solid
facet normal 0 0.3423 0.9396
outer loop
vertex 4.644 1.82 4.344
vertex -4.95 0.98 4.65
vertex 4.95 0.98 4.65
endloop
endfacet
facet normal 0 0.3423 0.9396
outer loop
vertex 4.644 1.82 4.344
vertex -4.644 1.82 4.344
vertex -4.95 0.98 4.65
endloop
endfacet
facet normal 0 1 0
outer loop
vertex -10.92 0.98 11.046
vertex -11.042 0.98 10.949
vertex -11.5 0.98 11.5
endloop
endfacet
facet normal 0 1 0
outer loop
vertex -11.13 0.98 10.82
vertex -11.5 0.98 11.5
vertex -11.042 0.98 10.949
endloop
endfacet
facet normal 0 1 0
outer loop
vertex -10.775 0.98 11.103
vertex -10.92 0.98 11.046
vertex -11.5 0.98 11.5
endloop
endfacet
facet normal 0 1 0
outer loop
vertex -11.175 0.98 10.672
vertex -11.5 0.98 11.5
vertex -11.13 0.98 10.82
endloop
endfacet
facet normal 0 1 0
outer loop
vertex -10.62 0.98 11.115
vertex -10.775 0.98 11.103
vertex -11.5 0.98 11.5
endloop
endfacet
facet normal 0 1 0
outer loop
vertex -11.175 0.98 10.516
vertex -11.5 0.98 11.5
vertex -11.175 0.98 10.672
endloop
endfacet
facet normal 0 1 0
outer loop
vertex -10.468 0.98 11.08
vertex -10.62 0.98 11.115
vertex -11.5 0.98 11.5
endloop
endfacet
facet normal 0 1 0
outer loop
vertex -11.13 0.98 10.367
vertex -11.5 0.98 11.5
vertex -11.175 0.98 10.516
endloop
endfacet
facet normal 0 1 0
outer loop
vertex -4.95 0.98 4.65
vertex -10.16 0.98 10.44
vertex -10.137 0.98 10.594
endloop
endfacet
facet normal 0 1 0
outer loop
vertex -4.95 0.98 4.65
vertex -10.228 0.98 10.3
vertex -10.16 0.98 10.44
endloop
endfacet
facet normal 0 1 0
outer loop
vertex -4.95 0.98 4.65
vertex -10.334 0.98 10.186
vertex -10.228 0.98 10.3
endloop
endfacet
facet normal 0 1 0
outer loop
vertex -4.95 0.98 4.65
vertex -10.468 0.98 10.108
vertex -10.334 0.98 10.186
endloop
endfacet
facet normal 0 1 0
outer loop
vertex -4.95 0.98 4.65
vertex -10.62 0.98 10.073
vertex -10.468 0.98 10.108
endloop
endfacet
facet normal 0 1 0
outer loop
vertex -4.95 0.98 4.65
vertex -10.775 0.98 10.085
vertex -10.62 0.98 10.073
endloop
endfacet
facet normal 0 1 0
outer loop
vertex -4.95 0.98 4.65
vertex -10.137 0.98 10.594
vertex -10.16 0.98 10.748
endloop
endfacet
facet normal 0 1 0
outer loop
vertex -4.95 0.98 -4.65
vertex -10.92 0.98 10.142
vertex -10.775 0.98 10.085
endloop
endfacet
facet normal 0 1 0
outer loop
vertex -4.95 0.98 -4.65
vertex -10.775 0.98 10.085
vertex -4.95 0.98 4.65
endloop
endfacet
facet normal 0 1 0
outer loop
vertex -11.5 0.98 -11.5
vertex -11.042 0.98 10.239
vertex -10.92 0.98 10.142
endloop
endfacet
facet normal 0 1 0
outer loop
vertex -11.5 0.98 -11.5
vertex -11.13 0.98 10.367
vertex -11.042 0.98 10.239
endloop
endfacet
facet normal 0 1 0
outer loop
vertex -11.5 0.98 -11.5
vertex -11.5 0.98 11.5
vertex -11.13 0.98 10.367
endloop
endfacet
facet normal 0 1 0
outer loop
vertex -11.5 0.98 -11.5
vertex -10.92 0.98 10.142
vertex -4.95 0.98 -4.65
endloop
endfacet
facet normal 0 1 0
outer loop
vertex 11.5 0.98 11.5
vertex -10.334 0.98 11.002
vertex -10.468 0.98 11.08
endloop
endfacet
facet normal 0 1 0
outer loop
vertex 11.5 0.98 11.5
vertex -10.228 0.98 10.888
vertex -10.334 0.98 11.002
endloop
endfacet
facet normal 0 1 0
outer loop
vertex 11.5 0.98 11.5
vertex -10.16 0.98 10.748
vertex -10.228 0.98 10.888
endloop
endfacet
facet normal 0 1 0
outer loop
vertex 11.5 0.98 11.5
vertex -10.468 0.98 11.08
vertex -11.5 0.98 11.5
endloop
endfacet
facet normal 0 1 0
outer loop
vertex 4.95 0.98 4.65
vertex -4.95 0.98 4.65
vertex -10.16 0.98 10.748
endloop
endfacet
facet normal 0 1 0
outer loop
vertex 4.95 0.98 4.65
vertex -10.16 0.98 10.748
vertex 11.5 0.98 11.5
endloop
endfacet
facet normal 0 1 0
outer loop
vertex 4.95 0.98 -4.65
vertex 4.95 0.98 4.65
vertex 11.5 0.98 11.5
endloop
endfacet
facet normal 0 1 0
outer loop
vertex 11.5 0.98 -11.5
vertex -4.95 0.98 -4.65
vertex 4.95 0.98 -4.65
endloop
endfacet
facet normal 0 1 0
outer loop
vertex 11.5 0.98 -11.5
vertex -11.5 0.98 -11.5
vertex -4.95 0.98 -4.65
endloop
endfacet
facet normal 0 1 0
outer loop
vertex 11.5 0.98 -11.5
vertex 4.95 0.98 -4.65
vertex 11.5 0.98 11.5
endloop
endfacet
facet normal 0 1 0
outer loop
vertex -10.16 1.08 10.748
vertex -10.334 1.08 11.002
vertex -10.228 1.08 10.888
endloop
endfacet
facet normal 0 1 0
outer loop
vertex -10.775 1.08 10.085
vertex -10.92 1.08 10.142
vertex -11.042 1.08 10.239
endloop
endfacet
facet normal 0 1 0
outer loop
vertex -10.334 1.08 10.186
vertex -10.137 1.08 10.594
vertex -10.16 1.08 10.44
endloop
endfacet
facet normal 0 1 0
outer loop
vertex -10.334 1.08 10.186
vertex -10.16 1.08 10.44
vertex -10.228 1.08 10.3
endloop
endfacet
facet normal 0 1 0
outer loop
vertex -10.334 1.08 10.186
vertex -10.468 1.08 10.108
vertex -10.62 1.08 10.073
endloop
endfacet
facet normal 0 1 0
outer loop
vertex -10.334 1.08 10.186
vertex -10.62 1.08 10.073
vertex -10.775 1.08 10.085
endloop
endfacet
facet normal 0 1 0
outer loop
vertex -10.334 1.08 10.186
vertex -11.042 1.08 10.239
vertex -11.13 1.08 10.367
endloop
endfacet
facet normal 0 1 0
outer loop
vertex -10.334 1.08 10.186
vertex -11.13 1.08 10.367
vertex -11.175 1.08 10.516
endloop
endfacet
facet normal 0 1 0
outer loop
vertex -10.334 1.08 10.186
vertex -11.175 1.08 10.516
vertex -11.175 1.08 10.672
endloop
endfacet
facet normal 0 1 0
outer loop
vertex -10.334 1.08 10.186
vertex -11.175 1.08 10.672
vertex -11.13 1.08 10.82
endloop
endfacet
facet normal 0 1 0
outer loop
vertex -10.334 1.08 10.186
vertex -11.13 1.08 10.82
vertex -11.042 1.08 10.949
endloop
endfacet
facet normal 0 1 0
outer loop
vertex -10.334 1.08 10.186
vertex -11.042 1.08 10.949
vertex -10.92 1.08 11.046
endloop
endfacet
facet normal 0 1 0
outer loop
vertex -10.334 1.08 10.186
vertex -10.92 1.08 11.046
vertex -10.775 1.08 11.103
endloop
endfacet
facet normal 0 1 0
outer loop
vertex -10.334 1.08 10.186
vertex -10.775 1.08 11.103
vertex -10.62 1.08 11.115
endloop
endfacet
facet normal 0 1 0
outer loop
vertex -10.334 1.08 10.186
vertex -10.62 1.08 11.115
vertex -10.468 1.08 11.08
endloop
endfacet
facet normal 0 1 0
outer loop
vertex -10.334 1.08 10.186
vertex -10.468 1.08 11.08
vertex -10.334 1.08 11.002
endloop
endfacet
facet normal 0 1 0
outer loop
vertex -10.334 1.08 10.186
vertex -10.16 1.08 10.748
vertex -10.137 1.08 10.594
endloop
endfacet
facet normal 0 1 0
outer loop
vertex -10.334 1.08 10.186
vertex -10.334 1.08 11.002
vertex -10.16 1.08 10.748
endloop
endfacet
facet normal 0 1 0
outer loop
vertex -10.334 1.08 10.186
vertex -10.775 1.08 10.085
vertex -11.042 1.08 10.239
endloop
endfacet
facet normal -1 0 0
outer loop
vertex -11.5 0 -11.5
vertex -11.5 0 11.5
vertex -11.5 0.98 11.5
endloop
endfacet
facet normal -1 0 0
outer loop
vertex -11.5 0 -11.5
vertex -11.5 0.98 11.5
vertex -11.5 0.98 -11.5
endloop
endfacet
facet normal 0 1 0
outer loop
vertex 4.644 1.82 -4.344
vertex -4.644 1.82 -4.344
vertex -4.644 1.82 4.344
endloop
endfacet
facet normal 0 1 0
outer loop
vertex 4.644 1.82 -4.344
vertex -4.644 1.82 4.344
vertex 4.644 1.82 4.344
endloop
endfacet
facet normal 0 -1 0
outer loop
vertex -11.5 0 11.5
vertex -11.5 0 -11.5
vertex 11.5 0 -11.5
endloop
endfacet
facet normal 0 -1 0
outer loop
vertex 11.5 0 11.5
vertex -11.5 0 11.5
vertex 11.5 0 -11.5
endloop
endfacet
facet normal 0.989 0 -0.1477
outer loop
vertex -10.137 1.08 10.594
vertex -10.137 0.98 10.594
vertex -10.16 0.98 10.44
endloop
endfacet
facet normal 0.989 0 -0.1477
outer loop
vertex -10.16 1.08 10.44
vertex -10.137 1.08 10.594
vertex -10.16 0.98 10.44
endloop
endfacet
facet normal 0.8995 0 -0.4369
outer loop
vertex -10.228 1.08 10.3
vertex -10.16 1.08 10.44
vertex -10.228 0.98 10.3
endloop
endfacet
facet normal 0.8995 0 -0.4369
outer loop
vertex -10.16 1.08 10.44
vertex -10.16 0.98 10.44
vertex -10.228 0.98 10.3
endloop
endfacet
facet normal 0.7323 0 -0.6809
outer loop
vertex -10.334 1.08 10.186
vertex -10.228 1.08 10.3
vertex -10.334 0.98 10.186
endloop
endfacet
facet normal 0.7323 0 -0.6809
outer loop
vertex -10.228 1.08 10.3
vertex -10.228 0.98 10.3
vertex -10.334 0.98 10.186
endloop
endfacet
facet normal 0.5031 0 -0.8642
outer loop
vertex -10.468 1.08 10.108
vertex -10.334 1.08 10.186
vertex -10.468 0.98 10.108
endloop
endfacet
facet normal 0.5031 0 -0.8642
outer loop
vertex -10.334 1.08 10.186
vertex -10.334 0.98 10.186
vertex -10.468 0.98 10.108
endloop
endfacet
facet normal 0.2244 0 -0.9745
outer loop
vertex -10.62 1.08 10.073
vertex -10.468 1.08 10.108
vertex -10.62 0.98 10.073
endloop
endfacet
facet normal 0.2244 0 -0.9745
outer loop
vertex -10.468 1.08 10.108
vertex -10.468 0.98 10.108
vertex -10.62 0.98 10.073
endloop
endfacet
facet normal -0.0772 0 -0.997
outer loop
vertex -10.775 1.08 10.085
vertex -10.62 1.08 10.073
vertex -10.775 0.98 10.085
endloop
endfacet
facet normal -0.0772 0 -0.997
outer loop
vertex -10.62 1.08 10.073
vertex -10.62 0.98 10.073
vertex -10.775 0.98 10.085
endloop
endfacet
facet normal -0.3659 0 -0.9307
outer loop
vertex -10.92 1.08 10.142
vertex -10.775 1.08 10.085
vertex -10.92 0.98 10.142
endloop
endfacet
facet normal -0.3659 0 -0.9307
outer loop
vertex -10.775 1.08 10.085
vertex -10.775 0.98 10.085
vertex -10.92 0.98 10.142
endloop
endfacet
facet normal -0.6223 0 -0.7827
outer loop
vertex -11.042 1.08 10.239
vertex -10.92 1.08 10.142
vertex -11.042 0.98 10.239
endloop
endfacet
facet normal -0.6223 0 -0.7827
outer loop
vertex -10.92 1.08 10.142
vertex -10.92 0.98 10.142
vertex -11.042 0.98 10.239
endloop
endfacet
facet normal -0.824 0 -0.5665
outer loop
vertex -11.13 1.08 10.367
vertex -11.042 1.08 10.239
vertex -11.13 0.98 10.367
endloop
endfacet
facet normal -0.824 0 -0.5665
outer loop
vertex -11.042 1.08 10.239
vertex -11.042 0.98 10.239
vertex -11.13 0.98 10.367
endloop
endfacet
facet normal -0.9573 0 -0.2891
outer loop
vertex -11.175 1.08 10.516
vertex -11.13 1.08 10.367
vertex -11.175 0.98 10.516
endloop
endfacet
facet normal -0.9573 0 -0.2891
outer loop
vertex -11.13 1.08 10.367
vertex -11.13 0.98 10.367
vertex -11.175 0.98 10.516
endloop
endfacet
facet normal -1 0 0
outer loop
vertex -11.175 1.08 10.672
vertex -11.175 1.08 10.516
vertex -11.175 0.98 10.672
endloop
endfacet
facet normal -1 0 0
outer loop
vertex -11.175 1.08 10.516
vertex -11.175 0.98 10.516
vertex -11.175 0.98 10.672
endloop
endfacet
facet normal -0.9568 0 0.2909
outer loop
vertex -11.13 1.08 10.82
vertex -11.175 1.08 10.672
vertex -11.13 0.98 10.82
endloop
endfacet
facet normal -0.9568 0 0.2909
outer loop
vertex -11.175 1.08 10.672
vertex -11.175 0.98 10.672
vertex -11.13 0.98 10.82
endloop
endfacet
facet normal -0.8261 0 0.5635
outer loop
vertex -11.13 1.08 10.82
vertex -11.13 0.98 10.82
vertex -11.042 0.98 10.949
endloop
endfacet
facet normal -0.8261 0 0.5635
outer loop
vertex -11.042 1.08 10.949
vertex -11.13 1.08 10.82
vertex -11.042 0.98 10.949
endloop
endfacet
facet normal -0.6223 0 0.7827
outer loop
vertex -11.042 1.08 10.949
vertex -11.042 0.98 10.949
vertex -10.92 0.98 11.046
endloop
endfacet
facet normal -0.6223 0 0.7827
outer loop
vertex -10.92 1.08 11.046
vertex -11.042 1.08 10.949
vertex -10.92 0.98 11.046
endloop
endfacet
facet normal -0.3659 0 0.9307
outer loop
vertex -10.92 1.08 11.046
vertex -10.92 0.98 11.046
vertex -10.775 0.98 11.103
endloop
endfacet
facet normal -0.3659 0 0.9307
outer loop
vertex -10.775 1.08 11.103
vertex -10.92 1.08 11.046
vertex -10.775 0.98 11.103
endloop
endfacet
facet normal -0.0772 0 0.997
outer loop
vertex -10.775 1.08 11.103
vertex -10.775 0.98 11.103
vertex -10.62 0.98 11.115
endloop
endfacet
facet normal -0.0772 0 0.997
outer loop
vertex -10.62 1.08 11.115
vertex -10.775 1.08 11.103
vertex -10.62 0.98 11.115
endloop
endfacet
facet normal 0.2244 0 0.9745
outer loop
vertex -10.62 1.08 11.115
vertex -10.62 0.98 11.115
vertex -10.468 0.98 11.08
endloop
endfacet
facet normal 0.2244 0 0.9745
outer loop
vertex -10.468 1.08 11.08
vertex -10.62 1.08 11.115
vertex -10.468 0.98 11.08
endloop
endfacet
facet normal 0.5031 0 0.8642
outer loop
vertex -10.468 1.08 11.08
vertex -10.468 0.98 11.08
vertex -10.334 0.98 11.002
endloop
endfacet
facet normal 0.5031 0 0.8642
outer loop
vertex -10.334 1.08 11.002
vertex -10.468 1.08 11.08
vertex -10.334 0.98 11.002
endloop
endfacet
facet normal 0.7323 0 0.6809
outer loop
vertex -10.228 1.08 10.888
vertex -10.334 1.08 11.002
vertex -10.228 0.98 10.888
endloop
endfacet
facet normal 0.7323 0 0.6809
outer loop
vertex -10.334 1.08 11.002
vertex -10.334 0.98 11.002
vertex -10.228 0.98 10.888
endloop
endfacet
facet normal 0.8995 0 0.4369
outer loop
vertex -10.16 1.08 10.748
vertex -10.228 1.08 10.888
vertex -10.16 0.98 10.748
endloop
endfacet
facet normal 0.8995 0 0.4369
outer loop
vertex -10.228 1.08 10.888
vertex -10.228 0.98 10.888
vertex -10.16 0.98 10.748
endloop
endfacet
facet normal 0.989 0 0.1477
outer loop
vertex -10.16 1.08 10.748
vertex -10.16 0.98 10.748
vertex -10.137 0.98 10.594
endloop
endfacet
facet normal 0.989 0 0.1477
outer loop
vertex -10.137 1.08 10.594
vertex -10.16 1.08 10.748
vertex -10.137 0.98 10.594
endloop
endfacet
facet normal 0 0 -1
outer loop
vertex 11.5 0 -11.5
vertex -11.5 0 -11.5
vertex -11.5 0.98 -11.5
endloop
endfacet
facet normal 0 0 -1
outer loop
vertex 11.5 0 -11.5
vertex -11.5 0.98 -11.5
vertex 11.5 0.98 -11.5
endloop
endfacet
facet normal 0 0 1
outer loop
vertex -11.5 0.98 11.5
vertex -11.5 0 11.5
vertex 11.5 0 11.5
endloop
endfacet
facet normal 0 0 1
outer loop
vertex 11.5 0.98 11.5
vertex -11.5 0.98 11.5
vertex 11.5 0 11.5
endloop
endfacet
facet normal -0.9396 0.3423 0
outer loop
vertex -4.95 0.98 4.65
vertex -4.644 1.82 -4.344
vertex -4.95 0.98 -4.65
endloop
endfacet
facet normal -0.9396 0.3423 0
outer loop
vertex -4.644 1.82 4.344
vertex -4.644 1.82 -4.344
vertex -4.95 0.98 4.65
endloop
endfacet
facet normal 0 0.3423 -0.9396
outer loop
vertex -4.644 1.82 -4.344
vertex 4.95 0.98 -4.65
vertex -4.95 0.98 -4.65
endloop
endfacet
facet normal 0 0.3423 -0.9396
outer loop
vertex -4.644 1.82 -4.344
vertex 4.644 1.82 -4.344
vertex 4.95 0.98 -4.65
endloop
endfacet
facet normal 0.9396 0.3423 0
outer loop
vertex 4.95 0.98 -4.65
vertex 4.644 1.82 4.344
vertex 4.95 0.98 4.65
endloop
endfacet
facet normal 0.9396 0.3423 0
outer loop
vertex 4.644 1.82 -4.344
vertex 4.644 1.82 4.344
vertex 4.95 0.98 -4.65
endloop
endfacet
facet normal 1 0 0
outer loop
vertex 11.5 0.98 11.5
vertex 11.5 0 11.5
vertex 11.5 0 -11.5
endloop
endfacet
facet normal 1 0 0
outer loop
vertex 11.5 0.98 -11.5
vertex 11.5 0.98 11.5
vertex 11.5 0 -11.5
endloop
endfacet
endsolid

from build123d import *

# Parameters (mm, degrees)
SKETCH8_W            = 23
SKETCH8_H            = 23
BOSS_EXTRUDE4_DEPTH  = 0.98
SKETCH16_W           = 9.9
SKETCH16_H           = 9.3
BOSS_EXTRUDE11_DEPTH = 0.84
BOSS_EXTRUDE11_TAPER = 20
SKETCH17_R           = 0.522081484
BOSS_EXTRUDE12_DEPTH = 0.1


with BuildPart() as part:
    # Sketch8 → Boss-Extrude4 (new body)
    with BuildSketch(Plane(origin=(0, 0, 0), x_dir=(1, 0, 0), z_dir=(0, 1, 0))):
        Rectangle(SKETCH8_W, SKETCH8_H)
    extrude(amount=BOSS_EXTRUDE4_DEPTH)

    # Sketch16 → Boss-Extrude11 (add)
    with BuildSketch(Plane(origin=(0, 0.98, 0), x_dir=(1, 0, 0), z_dir=(0, 1, 0))):
        Rectangle(SKETCH16_W, SKETCH16_H)
    extrude(amount=BOSS_EXTRUDE11_DEPTH, taper=BOSS_EXTRUDE11_TAPER)

    # Sketch17 → Boss-Extrude12 (add)
    with BuildSketch(Plane(origin=(0, 0.98, 0), x_dir=(1, 0, 0), z_dir=(0, 1, 0))):
        with Locations((-10.659163623, -10.593903438)):
            Circle(SKETCH17_R)
    extrude(amount=BOSS_EXTRUDE12_DEPTH)


solid = part.part
